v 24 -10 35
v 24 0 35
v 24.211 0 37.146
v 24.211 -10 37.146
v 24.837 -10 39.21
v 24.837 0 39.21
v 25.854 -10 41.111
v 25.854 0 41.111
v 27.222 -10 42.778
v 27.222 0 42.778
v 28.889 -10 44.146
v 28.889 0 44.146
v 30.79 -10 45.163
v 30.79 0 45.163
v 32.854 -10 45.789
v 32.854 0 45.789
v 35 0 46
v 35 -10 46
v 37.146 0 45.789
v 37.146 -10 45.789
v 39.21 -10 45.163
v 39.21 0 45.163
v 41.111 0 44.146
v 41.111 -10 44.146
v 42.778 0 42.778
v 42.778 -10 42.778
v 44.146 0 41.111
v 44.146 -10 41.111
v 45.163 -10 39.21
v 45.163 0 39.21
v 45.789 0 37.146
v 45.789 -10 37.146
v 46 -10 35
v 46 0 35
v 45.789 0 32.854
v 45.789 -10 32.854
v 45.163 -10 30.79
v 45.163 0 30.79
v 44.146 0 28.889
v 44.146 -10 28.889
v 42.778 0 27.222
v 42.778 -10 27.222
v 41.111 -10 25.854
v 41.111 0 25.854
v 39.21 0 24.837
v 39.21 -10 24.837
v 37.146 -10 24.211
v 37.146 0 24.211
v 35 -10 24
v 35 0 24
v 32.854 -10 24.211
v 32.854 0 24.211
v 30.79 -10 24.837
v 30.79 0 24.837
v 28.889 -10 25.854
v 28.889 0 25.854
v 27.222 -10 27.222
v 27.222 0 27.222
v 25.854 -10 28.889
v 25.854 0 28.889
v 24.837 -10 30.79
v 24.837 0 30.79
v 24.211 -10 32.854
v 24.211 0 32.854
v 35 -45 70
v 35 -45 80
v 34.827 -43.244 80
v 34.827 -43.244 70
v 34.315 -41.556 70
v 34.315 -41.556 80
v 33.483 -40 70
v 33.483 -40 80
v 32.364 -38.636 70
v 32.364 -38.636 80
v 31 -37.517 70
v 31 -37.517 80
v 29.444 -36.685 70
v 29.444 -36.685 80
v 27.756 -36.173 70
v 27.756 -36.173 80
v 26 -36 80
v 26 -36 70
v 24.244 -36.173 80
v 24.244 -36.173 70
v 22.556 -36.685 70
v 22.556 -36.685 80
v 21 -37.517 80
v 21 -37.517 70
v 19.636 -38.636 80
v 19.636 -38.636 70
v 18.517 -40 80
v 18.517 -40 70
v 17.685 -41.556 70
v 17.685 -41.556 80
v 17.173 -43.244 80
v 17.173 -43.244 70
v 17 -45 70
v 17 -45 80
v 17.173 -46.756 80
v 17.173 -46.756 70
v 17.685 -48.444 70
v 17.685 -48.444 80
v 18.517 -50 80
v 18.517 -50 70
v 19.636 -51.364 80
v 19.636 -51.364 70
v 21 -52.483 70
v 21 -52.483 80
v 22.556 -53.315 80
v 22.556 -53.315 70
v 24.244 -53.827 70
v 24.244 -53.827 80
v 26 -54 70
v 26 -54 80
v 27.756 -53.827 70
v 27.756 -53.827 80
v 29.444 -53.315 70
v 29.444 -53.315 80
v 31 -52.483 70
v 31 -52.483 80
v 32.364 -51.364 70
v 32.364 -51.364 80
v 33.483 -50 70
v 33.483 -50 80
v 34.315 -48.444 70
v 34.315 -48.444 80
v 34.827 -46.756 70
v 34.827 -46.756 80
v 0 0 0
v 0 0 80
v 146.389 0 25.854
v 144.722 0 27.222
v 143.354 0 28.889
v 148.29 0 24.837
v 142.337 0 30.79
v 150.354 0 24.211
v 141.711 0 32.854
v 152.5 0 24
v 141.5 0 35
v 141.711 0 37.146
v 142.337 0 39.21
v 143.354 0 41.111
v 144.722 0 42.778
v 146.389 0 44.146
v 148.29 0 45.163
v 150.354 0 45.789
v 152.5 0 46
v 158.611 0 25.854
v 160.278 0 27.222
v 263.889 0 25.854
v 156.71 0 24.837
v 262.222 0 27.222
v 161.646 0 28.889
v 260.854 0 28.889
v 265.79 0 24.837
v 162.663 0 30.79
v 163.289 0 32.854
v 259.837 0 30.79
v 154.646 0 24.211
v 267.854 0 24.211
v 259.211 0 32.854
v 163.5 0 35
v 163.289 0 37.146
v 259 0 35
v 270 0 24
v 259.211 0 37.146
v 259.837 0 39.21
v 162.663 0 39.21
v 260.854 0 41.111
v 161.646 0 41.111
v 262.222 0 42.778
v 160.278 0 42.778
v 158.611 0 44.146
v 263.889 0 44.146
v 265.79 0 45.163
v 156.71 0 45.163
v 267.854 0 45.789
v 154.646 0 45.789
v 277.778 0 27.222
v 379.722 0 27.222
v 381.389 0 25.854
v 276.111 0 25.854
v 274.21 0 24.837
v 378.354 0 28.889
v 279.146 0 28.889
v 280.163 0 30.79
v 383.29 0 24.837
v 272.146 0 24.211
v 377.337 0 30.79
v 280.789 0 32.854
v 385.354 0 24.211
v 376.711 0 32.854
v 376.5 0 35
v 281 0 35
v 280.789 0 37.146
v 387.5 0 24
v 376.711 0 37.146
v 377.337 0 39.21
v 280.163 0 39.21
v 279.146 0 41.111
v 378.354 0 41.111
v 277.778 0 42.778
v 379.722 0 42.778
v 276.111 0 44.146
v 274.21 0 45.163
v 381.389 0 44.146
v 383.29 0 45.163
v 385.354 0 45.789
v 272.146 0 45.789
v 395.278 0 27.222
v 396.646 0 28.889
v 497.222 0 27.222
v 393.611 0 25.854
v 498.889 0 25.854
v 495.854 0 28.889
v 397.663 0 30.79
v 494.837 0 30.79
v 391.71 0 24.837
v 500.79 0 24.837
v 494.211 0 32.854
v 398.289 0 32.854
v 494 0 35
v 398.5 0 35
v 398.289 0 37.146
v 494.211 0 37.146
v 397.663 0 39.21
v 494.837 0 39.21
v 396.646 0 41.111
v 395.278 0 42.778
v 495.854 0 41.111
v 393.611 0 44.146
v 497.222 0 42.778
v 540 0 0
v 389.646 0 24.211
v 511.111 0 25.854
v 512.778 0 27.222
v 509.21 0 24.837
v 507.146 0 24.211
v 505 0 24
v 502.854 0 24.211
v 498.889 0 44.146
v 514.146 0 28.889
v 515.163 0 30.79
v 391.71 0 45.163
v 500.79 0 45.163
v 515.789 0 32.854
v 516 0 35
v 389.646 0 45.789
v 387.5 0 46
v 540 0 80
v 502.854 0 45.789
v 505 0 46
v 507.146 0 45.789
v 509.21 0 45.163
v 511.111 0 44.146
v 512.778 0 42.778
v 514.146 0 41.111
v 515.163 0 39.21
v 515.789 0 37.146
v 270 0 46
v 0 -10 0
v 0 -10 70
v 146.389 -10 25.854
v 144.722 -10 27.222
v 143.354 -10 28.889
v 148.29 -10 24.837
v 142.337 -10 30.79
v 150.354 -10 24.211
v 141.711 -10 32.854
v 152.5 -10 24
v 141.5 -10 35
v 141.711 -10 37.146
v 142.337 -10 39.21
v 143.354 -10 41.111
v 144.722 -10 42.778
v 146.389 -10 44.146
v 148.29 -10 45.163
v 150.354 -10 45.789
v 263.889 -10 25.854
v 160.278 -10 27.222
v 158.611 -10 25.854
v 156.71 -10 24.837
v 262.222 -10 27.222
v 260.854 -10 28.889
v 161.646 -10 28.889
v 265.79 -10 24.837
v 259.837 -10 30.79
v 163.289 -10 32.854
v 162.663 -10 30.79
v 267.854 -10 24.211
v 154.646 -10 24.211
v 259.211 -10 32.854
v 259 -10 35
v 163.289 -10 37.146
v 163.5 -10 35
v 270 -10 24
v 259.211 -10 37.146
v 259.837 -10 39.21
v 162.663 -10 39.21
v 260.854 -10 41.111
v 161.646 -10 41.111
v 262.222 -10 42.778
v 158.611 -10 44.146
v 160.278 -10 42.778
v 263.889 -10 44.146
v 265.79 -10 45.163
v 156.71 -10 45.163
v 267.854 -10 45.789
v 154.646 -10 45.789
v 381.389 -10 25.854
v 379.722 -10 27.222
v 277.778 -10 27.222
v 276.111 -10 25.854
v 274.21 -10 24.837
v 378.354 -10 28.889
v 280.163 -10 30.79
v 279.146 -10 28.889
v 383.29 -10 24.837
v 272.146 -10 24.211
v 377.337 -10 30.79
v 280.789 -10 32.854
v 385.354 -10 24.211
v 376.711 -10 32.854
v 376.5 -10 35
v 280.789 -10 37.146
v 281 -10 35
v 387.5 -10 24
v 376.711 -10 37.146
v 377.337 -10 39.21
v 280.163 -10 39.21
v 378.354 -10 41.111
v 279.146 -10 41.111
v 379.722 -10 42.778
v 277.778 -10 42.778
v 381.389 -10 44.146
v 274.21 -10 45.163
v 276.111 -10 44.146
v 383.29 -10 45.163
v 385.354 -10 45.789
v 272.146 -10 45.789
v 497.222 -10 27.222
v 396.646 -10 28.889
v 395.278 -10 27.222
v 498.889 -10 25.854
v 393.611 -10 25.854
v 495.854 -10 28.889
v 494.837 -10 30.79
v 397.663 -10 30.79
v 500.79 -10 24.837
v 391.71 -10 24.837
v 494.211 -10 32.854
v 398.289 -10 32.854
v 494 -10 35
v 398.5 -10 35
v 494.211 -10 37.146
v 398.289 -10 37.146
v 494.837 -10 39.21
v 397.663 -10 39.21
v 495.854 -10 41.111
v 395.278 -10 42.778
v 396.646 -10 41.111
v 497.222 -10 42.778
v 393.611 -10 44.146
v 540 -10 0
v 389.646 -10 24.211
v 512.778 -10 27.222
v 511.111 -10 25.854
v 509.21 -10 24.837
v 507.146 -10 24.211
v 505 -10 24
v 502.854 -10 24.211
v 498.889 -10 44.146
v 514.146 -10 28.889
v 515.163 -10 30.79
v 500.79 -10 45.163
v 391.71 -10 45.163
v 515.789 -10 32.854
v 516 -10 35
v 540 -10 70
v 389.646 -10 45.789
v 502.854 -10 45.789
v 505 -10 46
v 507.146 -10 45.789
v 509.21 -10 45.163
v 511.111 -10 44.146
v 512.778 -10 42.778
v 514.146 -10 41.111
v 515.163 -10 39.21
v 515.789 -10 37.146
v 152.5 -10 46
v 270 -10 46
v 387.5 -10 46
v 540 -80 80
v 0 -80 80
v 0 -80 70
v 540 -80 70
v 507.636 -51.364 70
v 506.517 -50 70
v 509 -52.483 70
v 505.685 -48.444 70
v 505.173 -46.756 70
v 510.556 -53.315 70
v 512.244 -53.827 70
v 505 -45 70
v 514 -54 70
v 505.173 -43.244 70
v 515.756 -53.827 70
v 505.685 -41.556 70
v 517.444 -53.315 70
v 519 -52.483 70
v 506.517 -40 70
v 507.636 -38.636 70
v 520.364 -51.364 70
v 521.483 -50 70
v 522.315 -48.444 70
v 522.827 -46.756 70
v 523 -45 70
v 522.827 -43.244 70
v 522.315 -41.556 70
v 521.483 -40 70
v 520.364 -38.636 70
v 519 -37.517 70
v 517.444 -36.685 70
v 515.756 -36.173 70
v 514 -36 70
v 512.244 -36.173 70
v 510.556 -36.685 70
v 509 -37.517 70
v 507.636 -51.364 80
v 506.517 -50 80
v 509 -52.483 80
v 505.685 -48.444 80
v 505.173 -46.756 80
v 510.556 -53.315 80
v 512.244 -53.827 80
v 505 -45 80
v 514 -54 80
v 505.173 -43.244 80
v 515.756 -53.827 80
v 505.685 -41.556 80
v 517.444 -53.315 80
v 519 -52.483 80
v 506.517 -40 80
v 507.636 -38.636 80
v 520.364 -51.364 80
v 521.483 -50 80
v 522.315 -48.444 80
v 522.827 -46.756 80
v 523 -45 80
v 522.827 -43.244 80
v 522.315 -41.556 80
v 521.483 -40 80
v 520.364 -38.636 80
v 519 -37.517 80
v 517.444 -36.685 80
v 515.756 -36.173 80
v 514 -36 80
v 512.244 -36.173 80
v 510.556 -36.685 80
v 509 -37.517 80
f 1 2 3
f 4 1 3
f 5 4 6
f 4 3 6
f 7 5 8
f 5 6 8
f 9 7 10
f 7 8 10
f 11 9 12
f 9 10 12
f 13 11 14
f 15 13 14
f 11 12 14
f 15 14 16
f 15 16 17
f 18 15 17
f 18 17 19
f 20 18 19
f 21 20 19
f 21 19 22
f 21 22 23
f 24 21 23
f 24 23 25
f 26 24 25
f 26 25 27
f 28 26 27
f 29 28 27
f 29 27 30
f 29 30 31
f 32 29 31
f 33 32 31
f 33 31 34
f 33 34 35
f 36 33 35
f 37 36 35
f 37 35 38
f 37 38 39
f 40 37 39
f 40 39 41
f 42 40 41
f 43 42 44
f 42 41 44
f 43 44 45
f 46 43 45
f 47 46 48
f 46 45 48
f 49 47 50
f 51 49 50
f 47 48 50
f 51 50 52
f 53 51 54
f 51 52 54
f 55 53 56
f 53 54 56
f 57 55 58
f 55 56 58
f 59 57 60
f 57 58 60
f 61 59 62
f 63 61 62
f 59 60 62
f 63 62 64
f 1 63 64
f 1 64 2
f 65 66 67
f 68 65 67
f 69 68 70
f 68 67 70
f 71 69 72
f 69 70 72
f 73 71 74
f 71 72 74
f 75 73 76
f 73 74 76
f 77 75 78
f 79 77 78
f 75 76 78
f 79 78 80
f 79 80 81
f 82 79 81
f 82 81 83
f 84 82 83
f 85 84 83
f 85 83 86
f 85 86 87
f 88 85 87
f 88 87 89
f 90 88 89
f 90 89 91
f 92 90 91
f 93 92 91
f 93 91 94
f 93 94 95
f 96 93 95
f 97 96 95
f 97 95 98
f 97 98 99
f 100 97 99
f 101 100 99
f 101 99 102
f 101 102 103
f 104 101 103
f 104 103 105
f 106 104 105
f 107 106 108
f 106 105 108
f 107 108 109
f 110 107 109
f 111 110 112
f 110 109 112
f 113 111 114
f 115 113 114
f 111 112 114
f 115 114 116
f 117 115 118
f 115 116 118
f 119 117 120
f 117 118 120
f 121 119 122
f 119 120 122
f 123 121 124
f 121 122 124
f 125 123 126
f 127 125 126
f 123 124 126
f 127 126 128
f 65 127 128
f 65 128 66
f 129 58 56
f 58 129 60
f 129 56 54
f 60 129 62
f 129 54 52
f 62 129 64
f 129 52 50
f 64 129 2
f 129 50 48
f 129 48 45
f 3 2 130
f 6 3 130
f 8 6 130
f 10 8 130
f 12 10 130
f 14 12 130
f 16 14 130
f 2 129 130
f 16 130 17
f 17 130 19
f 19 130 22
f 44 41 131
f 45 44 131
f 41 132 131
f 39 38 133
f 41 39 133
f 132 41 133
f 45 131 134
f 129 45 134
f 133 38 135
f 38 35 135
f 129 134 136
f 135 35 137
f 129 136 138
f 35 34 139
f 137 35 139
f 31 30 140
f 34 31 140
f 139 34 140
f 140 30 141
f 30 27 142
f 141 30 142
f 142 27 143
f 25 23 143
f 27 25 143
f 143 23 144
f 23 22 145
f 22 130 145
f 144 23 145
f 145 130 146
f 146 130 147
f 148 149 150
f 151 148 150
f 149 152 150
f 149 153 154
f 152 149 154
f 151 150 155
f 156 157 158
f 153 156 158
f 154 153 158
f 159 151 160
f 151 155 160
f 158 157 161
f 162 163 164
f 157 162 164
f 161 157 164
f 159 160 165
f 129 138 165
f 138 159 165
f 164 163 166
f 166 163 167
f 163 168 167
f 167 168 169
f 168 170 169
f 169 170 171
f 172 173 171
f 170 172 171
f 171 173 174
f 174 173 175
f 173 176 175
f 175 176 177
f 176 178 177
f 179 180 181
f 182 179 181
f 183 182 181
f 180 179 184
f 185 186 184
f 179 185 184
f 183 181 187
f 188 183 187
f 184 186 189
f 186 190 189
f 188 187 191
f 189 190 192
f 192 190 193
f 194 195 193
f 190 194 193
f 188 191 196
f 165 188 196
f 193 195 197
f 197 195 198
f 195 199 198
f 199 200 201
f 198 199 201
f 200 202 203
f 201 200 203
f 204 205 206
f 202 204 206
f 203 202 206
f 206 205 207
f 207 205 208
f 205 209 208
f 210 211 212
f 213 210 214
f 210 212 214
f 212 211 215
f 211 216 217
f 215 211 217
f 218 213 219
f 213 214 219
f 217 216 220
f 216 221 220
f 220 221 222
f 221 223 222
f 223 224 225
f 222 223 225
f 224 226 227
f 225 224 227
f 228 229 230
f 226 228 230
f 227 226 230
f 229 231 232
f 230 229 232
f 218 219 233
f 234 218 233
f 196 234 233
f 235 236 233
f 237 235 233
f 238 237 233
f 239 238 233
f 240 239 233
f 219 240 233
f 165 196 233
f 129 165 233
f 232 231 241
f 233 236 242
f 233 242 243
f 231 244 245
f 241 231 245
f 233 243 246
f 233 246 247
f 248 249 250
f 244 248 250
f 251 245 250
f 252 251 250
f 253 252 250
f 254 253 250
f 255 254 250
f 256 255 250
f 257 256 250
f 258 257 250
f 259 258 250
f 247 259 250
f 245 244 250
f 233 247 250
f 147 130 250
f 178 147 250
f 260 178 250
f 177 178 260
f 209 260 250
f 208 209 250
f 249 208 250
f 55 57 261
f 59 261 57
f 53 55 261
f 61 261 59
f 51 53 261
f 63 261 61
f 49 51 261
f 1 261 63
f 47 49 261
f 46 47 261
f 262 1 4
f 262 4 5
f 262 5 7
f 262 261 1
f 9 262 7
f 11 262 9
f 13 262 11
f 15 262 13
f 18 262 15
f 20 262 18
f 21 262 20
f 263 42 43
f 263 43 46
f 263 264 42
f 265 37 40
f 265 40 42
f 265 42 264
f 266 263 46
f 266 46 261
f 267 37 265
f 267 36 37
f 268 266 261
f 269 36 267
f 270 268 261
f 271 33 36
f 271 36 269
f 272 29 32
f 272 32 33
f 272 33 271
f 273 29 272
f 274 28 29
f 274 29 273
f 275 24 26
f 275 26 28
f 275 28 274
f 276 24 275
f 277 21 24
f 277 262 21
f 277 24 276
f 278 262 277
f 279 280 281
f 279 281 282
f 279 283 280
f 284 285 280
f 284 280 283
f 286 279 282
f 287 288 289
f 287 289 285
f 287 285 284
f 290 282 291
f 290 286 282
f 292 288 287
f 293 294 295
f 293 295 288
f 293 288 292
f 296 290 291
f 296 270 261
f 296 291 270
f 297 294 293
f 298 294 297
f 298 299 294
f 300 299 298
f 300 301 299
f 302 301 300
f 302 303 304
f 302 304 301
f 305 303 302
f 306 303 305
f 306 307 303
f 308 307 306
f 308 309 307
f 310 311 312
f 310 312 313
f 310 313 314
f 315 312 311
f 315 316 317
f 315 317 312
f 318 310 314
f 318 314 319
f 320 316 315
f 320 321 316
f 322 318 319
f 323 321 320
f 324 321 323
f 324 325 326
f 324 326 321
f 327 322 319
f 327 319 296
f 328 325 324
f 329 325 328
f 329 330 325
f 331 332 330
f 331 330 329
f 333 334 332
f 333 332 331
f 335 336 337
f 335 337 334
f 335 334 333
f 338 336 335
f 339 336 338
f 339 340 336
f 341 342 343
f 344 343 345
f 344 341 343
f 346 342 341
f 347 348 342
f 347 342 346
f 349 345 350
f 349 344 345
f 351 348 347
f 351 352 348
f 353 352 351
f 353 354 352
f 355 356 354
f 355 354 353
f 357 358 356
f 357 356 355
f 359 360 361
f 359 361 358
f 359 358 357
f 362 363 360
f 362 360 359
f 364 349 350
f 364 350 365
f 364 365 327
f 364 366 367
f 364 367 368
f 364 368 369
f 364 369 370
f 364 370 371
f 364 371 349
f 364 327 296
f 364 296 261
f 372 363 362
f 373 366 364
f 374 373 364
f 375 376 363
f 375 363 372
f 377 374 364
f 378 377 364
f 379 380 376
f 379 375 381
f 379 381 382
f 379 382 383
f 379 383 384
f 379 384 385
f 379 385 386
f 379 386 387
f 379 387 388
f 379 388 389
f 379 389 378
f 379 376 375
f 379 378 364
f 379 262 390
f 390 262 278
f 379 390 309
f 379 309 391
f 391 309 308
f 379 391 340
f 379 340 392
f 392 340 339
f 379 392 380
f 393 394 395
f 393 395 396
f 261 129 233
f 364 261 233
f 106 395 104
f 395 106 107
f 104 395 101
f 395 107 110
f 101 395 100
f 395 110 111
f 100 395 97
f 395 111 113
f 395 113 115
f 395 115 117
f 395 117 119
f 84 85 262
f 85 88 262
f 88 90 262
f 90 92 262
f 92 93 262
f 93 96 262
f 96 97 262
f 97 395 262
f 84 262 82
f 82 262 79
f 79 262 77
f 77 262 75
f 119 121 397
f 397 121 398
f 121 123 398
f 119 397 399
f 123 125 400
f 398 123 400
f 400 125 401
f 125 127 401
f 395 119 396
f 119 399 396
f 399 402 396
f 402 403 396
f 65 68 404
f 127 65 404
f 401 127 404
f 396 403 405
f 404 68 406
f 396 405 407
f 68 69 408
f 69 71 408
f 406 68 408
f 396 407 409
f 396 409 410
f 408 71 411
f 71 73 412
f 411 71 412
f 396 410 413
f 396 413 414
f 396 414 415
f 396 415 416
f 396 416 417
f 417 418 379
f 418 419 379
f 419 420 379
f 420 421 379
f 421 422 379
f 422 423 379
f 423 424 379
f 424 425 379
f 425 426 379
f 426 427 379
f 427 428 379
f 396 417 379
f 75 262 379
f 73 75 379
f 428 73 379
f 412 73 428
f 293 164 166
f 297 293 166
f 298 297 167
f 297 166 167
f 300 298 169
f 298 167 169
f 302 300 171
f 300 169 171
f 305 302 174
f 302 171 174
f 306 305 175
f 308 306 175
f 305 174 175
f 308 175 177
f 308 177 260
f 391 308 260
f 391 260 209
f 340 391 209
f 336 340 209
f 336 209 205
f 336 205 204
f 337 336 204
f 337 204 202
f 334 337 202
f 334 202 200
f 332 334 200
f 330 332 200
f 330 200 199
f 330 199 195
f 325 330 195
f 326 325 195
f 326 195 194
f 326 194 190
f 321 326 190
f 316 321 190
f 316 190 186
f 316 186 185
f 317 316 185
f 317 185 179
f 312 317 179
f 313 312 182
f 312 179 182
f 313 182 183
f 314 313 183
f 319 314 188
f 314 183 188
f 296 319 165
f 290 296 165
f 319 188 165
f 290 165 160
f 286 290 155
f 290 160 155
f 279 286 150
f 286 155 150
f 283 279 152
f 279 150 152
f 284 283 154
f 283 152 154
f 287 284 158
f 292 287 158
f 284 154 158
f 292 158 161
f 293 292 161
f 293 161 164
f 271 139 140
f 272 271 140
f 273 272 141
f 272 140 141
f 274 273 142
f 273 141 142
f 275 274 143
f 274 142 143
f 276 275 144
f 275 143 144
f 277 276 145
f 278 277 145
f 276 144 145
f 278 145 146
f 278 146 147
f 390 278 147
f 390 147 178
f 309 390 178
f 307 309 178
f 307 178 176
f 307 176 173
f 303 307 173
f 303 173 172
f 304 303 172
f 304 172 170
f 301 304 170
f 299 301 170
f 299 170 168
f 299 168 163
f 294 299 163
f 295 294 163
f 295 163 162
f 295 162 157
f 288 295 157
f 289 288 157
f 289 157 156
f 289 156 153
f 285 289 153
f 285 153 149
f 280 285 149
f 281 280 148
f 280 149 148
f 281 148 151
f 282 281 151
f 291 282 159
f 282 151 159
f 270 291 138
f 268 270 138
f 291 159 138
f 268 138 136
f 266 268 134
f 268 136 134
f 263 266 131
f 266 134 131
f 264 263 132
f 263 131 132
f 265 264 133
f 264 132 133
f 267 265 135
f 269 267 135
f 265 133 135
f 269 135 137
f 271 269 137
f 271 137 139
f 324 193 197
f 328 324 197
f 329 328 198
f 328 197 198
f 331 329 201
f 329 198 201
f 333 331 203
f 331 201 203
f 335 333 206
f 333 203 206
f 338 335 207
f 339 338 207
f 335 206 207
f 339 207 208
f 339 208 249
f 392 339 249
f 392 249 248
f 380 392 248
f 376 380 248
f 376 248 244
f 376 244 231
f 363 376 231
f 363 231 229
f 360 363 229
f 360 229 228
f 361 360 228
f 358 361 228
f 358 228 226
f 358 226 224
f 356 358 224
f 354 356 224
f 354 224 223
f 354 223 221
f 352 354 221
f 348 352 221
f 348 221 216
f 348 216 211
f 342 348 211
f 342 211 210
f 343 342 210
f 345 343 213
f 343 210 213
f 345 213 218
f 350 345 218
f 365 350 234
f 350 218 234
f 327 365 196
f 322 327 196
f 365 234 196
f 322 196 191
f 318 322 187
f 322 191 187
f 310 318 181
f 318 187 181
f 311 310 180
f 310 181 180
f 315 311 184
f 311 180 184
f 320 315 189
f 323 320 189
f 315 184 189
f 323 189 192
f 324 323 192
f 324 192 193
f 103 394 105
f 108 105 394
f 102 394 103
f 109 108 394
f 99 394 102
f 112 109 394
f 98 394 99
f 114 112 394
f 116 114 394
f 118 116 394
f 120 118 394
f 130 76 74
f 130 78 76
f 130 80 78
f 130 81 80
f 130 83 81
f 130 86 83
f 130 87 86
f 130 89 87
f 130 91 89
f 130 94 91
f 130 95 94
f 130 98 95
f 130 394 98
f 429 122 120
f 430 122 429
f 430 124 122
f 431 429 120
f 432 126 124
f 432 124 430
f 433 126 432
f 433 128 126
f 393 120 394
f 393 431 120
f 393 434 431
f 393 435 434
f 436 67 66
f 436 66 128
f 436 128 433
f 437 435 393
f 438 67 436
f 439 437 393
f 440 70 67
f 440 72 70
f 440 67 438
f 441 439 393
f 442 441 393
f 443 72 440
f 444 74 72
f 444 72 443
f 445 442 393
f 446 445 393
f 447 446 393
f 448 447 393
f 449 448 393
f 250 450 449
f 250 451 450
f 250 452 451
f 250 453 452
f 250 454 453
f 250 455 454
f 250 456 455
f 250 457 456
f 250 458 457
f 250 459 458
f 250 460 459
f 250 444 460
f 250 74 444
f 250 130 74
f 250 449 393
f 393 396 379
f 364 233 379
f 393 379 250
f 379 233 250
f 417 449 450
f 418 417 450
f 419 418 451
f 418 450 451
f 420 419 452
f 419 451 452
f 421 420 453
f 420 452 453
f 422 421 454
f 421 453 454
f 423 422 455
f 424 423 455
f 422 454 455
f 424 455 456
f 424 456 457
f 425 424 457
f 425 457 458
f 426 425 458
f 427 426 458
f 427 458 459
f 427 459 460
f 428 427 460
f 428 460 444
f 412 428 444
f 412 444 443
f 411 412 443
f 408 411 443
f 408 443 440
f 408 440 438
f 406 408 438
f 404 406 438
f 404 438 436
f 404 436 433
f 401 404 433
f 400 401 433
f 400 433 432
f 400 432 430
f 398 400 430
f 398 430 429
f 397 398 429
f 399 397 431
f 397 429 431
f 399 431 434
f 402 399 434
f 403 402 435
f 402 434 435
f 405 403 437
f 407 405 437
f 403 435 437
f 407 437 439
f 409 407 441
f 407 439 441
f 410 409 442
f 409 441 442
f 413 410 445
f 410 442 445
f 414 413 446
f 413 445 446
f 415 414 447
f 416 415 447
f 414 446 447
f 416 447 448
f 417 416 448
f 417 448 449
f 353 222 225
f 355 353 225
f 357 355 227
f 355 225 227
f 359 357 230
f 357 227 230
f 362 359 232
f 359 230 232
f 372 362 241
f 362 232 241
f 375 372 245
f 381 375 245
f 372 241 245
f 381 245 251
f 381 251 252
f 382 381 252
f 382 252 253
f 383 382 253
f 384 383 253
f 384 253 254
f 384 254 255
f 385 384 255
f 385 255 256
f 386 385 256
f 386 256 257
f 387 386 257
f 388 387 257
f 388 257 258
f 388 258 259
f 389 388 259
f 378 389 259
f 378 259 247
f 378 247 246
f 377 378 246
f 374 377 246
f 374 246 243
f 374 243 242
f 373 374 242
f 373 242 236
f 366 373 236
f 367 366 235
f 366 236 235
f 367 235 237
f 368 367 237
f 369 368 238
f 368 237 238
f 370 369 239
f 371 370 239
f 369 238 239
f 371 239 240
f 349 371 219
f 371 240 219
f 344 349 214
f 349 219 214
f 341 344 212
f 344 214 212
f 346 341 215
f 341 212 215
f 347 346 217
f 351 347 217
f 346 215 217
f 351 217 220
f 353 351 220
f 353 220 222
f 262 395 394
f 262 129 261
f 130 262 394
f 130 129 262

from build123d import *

# Parameters (mm, degrees)
F0_W     = 540
F0_H     = 80
F1_DEPTH = 10
F2_W     = 540
F2_H     = 10
F3_DEPTH = 70
F4_R     = 11
F5_DEPTH = 80.001
F6_R     = 9
F7_DEPTH = 80.001


with BuildPart() as f1:
    # F0 (on Front) → F1 (new body)
    with BuildSketch(Plane.XZ):
        with Locations((270, 40)):
            Rectangle(F0_W, F0_H)
    extrude(amount=F1_DEPTH)

    # F2 (on face) → F3 (join)
    with BuildSketch(Plane.XZ.offset(10)):
        with Locations((270, 75)):
            Rectangle(F2_W, F2_H)
    extrude(amount=F3_DEPTH)

    # F4 (on face) → F5 (cut, through all)
    with BuildSketch(Plane(origin=(0, 0, 0), x_dir=(-1, 0, 0), z_dir=(0, 1, 0))):
        with Locations((-505, 35)):
            Circle(F4_R)
        with Locations((-387.5, 35)):
            Circle(F4_R)
        with Locations((-270, 35)):
            Circle(F4_R)
        with Locations((-152.5, 35)):
            Circle(F4_R)
        with Locations((-35, 35)):
            Circle(F4_R)
    extrude(amount=-F5_DEPTH, mode=Mode.SUBTRACT)

    # F6 (on face) → F7 (cut, through all)
    with BuildSketch(Plane.XY.offset(80)):
        with Locations((26, -45)):
            Circle(F6_R)
        with Locations((514, -45)):
            Circle(F6_R)
    extrude(amount=-F7_DEPTH, mode=Mode.SUBTRACT)


solid = f1.part
